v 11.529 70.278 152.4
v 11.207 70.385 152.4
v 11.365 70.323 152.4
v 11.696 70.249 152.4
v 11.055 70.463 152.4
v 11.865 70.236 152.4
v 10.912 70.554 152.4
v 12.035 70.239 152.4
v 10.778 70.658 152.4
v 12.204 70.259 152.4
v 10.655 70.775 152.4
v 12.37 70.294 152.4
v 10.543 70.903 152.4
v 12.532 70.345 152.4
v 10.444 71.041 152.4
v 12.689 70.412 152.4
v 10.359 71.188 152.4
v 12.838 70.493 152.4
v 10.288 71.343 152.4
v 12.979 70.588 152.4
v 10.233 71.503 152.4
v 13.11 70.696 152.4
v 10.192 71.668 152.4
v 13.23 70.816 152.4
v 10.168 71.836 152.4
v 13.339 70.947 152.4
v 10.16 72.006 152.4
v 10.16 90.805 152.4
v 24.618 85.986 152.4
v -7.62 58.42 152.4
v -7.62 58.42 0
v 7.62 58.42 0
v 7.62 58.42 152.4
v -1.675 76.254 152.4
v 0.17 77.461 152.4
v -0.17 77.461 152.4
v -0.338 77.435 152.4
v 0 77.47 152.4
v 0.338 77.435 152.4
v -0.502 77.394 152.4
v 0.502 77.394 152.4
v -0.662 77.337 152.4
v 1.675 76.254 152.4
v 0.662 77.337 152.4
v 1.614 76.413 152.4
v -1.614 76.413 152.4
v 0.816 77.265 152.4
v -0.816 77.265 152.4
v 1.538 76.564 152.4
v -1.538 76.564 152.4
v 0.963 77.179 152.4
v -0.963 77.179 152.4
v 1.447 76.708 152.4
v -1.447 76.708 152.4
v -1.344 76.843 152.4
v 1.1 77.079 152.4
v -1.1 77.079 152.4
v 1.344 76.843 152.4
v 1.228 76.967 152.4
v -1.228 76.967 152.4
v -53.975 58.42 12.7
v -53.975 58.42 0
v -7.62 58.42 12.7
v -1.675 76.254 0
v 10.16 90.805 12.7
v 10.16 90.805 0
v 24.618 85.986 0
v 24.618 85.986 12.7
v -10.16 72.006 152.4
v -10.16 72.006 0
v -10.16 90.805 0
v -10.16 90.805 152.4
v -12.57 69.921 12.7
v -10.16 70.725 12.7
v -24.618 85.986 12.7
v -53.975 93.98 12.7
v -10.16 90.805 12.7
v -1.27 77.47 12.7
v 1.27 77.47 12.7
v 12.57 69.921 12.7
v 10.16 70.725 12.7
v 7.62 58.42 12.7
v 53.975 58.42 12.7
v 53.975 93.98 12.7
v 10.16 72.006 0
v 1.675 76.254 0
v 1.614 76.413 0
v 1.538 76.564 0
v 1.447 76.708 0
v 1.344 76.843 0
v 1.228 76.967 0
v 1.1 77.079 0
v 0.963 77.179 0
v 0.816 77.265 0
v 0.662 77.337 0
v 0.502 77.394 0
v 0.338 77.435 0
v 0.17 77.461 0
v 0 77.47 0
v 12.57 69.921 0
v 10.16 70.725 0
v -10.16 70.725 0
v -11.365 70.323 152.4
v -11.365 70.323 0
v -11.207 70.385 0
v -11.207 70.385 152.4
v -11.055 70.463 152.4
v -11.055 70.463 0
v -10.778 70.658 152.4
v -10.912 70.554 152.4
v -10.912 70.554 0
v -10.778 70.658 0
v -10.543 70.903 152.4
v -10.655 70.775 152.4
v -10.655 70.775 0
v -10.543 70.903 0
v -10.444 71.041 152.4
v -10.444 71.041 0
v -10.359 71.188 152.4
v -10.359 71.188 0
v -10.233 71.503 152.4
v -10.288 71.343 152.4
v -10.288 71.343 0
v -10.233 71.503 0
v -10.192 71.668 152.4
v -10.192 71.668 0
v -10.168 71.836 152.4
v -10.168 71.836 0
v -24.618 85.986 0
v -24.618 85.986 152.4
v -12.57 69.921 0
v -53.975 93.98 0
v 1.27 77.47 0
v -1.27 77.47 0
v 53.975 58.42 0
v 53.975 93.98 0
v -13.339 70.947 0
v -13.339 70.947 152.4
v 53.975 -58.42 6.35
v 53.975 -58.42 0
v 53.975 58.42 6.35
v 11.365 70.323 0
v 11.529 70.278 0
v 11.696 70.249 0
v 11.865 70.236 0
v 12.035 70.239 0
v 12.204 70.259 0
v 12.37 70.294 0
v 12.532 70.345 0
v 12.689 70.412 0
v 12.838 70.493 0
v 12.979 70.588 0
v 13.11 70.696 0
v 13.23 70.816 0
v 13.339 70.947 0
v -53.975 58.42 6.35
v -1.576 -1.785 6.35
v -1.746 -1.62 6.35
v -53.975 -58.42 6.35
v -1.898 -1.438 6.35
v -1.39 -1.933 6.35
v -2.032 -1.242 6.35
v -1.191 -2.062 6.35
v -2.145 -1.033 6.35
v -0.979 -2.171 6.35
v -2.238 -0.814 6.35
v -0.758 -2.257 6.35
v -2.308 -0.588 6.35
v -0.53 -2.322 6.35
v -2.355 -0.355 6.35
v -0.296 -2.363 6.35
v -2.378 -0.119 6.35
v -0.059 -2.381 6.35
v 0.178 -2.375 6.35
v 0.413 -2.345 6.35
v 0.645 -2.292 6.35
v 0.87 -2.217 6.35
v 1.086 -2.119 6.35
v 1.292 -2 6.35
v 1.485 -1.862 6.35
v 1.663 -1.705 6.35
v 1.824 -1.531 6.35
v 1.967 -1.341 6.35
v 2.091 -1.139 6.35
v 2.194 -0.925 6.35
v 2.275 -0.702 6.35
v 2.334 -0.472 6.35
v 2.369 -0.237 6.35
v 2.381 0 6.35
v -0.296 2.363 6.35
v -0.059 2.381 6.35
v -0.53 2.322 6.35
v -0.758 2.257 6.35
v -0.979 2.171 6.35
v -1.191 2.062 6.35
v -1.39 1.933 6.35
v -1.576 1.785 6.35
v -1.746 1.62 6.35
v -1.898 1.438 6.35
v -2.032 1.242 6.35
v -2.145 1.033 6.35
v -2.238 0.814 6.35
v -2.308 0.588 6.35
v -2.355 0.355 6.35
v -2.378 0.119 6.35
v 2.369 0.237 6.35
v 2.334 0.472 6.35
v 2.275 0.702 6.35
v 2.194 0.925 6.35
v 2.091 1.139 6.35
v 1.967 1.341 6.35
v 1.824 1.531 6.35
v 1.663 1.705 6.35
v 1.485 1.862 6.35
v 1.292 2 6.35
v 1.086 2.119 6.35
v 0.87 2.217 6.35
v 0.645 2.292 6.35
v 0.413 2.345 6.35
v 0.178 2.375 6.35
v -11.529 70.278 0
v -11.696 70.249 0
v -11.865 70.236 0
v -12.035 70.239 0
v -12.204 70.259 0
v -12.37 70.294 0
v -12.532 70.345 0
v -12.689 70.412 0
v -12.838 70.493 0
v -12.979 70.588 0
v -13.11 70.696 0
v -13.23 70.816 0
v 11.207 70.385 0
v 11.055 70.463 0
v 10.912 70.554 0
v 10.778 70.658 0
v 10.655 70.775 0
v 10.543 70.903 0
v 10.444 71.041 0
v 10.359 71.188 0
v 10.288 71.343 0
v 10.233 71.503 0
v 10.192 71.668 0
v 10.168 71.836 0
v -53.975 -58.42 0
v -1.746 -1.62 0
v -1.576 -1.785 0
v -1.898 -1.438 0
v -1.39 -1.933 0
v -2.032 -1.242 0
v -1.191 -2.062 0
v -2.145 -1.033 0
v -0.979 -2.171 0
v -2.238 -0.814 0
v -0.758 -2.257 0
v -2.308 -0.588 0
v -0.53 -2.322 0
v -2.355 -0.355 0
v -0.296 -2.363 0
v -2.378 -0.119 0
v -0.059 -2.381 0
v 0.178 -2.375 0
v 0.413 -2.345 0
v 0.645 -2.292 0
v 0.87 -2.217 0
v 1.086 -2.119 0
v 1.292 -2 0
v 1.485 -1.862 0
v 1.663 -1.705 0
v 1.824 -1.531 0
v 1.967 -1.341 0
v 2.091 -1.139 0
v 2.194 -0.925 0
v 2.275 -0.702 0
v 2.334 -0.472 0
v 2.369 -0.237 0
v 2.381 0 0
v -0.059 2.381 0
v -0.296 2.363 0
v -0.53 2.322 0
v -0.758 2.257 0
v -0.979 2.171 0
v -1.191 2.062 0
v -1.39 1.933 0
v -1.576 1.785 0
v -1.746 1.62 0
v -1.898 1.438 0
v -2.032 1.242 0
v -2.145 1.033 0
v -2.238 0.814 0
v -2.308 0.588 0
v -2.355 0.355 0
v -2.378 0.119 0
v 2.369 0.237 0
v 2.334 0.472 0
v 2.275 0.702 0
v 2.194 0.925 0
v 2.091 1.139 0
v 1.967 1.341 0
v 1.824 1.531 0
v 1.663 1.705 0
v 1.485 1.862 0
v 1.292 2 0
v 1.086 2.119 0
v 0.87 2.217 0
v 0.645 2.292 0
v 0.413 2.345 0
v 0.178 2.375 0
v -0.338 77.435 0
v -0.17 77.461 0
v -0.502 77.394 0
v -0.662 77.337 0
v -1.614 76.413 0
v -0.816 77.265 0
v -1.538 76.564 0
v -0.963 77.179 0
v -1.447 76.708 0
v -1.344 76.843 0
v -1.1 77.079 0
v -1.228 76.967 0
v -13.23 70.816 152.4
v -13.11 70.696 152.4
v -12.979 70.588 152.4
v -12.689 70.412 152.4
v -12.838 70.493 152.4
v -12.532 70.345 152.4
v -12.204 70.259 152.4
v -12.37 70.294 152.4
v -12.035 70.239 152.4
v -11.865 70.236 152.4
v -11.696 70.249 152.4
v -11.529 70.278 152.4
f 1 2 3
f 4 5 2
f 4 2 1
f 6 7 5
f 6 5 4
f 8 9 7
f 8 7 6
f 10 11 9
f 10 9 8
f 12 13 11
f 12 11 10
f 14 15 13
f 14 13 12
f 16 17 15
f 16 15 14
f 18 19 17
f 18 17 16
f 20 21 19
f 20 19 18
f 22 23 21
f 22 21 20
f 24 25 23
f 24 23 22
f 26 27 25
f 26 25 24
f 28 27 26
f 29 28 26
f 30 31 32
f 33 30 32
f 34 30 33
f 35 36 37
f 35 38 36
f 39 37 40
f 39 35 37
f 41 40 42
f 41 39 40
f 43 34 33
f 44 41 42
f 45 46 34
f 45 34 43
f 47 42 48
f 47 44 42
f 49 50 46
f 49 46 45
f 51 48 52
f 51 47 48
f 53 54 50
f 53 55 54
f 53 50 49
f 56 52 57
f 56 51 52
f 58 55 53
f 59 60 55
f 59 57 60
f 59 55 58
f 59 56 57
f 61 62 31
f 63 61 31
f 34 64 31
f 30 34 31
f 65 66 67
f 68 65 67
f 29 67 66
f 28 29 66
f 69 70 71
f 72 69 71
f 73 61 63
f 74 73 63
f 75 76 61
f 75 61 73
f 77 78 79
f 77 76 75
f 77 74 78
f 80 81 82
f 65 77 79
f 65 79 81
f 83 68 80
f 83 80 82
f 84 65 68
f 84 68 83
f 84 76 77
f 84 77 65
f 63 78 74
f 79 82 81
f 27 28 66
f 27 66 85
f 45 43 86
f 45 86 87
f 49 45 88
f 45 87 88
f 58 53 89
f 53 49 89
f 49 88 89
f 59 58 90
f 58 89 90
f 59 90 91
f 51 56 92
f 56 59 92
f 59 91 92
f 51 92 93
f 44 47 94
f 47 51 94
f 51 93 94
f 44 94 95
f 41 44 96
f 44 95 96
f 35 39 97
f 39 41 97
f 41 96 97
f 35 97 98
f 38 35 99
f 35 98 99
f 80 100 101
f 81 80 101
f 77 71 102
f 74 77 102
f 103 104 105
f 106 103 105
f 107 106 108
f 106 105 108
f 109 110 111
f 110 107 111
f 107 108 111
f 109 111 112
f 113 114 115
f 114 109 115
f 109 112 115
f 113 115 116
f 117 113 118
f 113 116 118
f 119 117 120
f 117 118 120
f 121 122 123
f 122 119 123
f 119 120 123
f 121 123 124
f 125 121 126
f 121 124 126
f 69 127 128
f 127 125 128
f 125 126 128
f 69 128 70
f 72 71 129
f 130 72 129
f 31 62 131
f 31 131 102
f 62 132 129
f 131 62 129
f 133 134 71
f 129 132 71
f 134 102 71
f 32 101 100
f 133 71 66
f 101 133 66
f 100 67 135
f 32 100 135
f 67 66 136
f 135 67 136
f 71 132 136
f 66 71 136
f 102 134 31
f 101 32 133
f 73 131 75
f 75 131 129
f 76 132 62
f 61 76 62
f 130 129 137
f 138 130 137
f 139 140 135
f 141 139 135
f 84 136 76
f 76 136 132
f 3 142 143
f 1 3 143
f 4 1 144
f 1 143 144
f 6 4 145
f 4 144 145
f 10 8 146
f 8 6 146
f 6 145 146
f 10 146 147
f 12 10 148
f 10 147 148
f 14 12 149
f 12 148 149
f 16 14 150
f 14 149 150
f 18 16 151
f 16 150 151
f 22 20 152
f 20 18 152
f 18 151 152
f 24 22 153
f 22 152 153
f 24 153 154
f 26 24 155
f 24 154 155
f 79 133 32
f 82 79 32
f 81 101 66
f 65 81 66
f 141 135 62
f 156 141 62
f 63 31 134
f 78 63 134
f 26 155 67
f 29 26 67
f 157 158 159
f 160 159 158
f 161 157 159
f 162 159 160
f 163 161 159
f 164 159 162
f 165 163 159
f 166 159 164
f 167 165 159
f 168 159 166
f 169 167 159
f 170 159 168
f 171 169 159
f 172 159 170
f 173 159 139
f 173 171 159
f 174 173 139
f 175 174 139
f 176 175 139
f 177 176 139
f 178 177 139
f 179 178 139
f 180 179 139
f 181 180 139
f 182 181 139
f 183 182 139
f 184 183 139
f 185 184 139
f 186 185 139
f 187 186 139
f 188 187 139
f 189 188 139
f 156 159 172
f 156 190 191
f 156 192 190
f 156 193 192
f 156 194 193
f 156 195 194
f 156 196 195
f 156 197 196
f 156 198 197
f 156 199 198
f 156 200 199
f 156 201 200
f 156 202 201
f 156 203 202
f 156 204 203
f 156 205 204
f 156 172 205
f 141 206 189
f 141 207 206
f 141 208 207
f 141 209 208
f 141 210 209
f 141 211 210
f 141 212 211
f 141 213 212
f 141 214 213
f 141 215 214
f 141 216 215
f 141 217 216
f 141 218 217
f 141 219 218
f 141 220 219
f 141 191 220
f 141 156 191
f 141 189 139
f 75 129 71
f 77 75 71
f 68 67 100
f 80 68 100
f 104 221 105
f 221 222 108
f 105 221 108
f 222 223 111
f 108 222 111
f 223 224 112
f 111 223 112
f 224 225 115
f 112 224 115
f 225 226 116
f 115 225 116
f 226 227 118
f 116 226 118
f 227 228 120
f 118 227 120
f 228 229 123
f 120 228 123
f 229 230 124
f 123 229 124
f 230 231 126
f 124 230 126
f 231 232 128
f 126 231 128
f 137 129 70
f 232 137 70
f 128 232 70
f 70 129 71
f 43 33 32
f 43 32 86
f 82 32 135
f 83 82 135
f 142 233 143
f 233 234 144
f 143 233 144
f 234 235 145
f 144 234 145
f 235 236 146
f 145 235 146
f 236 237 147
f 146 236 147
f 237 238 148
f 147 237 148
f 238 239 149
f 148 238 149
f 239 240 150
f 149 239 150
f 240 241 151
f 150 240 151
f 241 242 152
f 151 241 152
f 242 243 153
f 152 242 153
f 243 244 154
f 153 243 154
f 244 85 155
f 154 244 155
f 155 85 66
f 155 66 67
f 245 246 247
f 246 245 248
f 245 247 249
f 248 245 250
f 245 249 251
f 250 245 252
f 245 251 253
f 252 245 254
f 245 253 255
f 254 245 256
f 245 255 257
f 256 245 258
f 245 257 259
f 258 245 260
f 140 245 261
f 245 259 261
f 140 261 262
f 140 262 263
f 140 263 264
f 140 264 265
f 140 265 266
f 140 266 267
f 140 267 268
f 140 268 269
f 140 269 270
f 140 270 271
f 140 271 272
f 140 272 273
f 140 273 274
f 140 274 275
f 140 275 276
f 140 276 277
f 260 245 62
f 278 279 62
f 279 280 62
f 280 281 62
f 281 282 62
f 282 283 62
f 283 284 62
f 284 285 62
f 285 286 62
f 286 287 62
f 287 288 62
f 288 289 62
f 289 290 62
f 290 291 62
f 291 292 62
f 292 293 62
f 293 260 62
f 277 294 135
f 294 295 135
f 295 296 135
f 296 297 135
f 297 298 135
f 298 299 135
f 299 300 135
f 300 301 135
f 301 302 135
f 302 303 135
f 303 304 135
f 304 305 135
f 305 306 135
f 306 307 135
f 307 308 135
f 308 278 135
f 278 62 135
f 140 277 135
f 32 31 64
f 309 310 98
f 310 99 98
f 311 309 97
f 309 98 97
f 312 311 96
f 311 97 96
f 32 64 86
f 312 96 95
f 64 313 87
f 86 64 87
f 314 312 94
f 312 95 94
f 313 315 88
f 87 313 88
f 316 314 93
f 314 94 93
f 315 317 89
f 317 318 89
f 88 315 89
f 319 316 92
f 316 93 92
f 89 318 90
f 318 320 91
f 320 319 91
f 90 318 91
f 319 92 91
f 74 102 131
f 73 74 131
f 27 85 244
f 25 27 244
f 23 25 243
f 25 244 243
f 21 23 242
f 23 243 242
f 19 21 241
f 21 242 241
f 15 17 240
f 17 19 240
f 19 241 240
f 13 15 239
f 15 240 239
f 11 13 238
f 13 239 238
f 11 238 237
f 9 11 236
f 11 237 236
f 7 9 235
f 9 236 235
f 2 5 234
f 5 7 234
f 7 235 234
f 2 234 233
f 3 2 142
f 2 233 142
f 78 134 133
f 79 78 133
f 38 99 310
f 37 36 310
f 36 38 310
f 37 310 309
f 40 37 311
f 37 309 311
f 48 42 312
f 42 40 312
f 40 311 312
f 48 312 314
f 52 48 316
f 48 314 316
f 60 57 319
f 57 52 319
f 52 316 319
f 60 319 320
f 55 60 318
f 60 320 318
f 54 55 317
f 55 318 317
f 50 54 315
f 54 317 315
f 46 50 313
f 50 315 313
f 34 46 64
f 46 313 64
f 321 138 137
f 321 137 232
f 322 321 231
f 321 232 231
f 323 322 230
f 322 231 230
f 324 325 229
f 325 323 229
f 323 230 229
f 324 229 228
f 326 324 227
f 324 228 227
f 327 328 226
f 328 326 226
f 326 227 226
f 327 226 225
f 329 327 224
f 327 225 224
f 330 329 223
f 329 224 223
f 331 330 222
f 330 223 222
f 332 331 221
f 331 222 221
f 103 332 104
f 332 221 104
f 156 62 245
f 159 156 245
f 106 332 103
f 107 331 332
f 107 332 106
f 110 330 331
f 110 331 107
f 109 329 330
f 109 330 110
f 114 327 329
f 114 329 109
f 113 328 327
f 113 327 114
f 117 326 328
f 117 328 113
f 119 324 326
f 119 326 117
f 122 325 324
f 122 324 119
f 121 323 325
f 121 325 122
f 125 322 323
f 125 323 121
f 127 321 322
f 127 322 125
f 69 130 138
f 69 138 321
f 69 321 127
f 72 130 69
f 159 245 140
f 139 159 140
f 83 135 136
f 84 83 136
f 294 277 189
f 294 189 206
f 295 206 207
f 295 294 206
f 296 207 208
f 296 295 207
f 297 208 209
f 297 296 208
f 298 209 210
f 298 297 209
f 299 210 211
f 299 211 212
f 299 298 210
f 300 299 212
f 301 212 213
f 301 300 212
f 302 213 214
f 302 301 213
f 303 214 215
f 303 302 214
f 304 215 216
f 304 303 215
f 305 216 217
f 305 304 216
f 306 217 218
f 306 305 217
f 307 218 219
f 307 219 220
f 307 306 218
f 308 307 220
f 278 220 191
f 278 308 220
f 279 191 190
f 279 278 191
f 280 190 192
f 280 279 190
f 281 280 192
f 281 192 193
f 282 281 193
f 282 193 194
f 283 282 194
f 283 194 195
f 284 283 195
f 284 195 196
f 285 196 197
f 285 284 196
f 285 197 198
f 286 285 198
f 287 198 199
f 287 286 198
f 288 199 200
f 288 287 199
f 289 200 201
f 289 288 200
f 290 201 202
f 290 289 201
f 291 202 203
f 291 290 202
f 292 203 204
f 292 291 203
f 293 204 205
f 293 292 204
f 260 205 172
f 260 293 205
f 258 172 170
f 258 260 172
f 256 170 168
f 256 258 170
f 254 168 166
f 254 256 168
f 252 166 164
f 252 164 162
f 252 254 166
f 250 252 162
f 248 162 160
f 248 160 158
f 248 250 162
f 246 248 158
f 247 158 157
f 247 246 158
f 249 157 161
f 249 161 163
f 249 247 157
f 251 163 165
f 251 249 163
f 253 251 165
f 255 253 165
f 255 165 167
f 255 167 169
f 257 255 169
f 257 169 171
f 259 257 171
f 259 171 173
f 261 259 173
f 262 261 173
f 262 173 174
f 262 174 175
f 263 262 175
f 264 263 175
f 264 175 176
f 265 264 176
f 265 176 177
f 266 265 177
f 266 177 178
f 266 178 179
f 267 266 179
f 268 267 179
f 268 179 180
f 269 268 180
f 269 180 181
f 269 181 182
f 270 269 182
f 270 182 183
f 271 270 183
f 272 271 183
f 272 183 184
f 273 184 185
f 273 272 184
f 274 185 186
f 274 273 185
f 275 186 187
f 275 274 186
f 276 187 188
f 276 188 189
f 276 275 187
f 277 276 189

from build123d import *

# Parameters (mm, degrees)
F1_DEPTH      = 152.4
F0_R          = 2.38125
F2_DEPTH      = 6.35
F3_DEPTH      = 12.7
F4_T1_DEPTH   = 158.8075491552
F4_2_T1_DEPTH = 158.8075494663
F4_3_T1_DEPTH = 158.8075494663


# Not quite as in the source:
# - a fillet or chamfer that OpenCascade refuses, or shapes differently, is made with other operations: its cross-section is extruded or revolved along the edge and cut away or added


with BuildPart() as f1:
    # F0 (on Top) → F1 (new body)
    with BuildSketch(Plane.XY):
        Polygon((-10.16, 70.724540249), (-10.16, 90.805), (-24.6179332403, 85.98568818), (-12.56965591, 69.921321489), align=None)
    extrude(amount=F1_DEPTH)

    # F4: fillet of radius 1.778 on 2 edges, made by hand

    # F4_s2 → F4_t1 (cut)
    with BuildSketch(Plane.XY.offset(-3.2037745776)):
        with BuildLine():
            ThreePointArc((-11.3757469543, 70.319291202), (-10.4956113708, 70.9664352271), (-10.16, 72.0060500801))
            Line((-10.16, 72.0060500801), (-10.16, 70.724540249))
            Line((-10.16, 70.724540249), (-11.3757469543, 70.319291202))
        make_face()
        with BuildLine():
            ThreePointArc((-13.3385619031, 70.946529283), (-12.4463038366, 70.3162043054), (-11.3539089557, 70.326570536))
            Line((-11.3539089557, 70.326570536), (-12.56965591, 69.921321489))
            Line((-12.56965591, 69.921321489), (-13.3385619031, 70.946529283))
        make_face()
    extrude(amount=F4_T1_DEPTH, mode=Mode.SUBTRACT)


with BuildPart() as f1b:
    # F0 (on Top) → F1, piece 2 (new body)
    with BuildSketch(Plane.XY):
        Polygon((24.6179334623, 85.9856888459), (10.16, 90.805), (10.16, 70.7245368579), (12.569655577, 69.9213183322), align=None)
    extrude(amount=F1_DEPTH)

    # F4#2: fillet of radius 1.778 on 2 edges, made by hand

    # F4_2_s2 → F4_2_t1 (cut)
    with BuildSketch(Plane.XY.offset(-3.2037747331)):
        with BuildLine():
            ThreePointArc((10.16, 72.0060467512), (10.4956113948, 70.9664318651), (11.375747032, 70.3192878473))
            Line((11.375747032, 70.3192878473), (10.16, 70.7245368579))
            Line((10.16, 70.7245368579), (10.16, 72.0060467512))
        make_face()
        with BuildLine():
            ThreePointArc((11.353908545, 70.3265673429), (12.4463034655, 70.3162011748), (13.338561513, 70.9465262469))
            Line((13.338561513, 70.9465262469), (12.569655577, 69.9213183322))
            Line((12.569655577, 69.9213183322), (11.353908545, 70.3265673429))
        make_face()
    extrude(amount=F4_2_T1_DEPTH, mode=Mode.SUBTRACT)


with BuildPart() as f1c:
    # F0 (on Top) → F1, piece 3 (new body)
    with BuildSketch(Plane.XY):
        Polygon((0, 77.47), (0, 58.42), (7.62, 58.42), (1.27, 77.47), align=None)
        Polygon((-1.27, 77.47), (-7.62, 58.42), (0, 58.42), (0, 77.47), align=None)
    extrude(amount=F1_DEPTH)

    # F4#3: fillet of radius 1.778 on 2 edges, made by hand

    # F4_3_s2 → F4_3_t1 (cut)
    with BuildSketch(Plane.XY.offset(-3.2037747331)):
        with BuildLine():
            ThreePointArc((0.0115098933, 77.47), (-1.0281049929, 77.1343886052), (-1.6752490107, 76.254252968))
            Line((-1.6752490107, 76.254252968), (-1.27, 77.47))
            Line((-1.27, 77.47), (0.0115098933, 77.47))
        make_face()
        with BuildLine():
            ThreePointArc((1.6752490107, 76.254252968), (1.0281049929, 77.1343886052), (-0.0115098933, 77.47))
            Line((-0.0115098933, 77.47), (1.27, 77.47))
            Line((1.27, 77.47), (1.6752490107, 76.254252968))
        make_face()
    extrude(amount=F4_3_T1_DEPTH, mode=Mode.SUBTRACT)


with BuildPart() as f2:
    # F0 (on Top) → F2 (new body)
    with BuildSketch(Plane.XY):
        Polygon((-7.62, 58.42), (-53.975, 58.42), (-53.975, -58.42), (53.975, -58.42), (53.975, 58.42), (7.62, 58.42), (0, 58.42), align=None)
        Circle(F0_R, mode=Mode.SUBTRACT)
    extrude(amount=F2_DEPTH)


with BuildPart() as f3:
    # F0 (on Top) → F3 (new body)
    with BuildSketch(Plane.XY):
        Polygon((-53.975, 90.805), (-53.975, 58.42), (-7.62, 58.42), (-1.27, 77.47), (0, 77.47), (0, 90.805), (-10.16, 90.805), align=None)
        Polygon((-24.6179332403, 85.98568818), (-10.16, 90.805), (-10.16, 70.724540249), (-12.56965591, 69.921321489), align=None, mode=Mode.SUBTRACT)
        Polygon((1.27, 77.47), (7.62, 58.42), (53.975, 58.42), (53.975, 90.805), (10.16, 90.805), (0, 90.805), (0, 77.47), align=None)
        Polygon((10.16, 70.7245368579), (10.16, 90.805), (24.6179334623, 85.9856888459), (12.569655577, 69.9213183322), align=None, mode=Mode.SUBTRACT)
        Polygon((53.975, 93.98), (0, 93.98), (0, 90.805), (10.16, 90.805), (53.975, 90.805), align=None)
        Polygon((-53.975, 93.98), (-53.975, 90.805), (-10.16, 90.805), (0, 90.805), (0, 93.98), align=None)
    extrude(amount=F3_DEPTH)


solid = Compound([f1.part, f1b.part, f1c.part, f2.part, f3.part])
